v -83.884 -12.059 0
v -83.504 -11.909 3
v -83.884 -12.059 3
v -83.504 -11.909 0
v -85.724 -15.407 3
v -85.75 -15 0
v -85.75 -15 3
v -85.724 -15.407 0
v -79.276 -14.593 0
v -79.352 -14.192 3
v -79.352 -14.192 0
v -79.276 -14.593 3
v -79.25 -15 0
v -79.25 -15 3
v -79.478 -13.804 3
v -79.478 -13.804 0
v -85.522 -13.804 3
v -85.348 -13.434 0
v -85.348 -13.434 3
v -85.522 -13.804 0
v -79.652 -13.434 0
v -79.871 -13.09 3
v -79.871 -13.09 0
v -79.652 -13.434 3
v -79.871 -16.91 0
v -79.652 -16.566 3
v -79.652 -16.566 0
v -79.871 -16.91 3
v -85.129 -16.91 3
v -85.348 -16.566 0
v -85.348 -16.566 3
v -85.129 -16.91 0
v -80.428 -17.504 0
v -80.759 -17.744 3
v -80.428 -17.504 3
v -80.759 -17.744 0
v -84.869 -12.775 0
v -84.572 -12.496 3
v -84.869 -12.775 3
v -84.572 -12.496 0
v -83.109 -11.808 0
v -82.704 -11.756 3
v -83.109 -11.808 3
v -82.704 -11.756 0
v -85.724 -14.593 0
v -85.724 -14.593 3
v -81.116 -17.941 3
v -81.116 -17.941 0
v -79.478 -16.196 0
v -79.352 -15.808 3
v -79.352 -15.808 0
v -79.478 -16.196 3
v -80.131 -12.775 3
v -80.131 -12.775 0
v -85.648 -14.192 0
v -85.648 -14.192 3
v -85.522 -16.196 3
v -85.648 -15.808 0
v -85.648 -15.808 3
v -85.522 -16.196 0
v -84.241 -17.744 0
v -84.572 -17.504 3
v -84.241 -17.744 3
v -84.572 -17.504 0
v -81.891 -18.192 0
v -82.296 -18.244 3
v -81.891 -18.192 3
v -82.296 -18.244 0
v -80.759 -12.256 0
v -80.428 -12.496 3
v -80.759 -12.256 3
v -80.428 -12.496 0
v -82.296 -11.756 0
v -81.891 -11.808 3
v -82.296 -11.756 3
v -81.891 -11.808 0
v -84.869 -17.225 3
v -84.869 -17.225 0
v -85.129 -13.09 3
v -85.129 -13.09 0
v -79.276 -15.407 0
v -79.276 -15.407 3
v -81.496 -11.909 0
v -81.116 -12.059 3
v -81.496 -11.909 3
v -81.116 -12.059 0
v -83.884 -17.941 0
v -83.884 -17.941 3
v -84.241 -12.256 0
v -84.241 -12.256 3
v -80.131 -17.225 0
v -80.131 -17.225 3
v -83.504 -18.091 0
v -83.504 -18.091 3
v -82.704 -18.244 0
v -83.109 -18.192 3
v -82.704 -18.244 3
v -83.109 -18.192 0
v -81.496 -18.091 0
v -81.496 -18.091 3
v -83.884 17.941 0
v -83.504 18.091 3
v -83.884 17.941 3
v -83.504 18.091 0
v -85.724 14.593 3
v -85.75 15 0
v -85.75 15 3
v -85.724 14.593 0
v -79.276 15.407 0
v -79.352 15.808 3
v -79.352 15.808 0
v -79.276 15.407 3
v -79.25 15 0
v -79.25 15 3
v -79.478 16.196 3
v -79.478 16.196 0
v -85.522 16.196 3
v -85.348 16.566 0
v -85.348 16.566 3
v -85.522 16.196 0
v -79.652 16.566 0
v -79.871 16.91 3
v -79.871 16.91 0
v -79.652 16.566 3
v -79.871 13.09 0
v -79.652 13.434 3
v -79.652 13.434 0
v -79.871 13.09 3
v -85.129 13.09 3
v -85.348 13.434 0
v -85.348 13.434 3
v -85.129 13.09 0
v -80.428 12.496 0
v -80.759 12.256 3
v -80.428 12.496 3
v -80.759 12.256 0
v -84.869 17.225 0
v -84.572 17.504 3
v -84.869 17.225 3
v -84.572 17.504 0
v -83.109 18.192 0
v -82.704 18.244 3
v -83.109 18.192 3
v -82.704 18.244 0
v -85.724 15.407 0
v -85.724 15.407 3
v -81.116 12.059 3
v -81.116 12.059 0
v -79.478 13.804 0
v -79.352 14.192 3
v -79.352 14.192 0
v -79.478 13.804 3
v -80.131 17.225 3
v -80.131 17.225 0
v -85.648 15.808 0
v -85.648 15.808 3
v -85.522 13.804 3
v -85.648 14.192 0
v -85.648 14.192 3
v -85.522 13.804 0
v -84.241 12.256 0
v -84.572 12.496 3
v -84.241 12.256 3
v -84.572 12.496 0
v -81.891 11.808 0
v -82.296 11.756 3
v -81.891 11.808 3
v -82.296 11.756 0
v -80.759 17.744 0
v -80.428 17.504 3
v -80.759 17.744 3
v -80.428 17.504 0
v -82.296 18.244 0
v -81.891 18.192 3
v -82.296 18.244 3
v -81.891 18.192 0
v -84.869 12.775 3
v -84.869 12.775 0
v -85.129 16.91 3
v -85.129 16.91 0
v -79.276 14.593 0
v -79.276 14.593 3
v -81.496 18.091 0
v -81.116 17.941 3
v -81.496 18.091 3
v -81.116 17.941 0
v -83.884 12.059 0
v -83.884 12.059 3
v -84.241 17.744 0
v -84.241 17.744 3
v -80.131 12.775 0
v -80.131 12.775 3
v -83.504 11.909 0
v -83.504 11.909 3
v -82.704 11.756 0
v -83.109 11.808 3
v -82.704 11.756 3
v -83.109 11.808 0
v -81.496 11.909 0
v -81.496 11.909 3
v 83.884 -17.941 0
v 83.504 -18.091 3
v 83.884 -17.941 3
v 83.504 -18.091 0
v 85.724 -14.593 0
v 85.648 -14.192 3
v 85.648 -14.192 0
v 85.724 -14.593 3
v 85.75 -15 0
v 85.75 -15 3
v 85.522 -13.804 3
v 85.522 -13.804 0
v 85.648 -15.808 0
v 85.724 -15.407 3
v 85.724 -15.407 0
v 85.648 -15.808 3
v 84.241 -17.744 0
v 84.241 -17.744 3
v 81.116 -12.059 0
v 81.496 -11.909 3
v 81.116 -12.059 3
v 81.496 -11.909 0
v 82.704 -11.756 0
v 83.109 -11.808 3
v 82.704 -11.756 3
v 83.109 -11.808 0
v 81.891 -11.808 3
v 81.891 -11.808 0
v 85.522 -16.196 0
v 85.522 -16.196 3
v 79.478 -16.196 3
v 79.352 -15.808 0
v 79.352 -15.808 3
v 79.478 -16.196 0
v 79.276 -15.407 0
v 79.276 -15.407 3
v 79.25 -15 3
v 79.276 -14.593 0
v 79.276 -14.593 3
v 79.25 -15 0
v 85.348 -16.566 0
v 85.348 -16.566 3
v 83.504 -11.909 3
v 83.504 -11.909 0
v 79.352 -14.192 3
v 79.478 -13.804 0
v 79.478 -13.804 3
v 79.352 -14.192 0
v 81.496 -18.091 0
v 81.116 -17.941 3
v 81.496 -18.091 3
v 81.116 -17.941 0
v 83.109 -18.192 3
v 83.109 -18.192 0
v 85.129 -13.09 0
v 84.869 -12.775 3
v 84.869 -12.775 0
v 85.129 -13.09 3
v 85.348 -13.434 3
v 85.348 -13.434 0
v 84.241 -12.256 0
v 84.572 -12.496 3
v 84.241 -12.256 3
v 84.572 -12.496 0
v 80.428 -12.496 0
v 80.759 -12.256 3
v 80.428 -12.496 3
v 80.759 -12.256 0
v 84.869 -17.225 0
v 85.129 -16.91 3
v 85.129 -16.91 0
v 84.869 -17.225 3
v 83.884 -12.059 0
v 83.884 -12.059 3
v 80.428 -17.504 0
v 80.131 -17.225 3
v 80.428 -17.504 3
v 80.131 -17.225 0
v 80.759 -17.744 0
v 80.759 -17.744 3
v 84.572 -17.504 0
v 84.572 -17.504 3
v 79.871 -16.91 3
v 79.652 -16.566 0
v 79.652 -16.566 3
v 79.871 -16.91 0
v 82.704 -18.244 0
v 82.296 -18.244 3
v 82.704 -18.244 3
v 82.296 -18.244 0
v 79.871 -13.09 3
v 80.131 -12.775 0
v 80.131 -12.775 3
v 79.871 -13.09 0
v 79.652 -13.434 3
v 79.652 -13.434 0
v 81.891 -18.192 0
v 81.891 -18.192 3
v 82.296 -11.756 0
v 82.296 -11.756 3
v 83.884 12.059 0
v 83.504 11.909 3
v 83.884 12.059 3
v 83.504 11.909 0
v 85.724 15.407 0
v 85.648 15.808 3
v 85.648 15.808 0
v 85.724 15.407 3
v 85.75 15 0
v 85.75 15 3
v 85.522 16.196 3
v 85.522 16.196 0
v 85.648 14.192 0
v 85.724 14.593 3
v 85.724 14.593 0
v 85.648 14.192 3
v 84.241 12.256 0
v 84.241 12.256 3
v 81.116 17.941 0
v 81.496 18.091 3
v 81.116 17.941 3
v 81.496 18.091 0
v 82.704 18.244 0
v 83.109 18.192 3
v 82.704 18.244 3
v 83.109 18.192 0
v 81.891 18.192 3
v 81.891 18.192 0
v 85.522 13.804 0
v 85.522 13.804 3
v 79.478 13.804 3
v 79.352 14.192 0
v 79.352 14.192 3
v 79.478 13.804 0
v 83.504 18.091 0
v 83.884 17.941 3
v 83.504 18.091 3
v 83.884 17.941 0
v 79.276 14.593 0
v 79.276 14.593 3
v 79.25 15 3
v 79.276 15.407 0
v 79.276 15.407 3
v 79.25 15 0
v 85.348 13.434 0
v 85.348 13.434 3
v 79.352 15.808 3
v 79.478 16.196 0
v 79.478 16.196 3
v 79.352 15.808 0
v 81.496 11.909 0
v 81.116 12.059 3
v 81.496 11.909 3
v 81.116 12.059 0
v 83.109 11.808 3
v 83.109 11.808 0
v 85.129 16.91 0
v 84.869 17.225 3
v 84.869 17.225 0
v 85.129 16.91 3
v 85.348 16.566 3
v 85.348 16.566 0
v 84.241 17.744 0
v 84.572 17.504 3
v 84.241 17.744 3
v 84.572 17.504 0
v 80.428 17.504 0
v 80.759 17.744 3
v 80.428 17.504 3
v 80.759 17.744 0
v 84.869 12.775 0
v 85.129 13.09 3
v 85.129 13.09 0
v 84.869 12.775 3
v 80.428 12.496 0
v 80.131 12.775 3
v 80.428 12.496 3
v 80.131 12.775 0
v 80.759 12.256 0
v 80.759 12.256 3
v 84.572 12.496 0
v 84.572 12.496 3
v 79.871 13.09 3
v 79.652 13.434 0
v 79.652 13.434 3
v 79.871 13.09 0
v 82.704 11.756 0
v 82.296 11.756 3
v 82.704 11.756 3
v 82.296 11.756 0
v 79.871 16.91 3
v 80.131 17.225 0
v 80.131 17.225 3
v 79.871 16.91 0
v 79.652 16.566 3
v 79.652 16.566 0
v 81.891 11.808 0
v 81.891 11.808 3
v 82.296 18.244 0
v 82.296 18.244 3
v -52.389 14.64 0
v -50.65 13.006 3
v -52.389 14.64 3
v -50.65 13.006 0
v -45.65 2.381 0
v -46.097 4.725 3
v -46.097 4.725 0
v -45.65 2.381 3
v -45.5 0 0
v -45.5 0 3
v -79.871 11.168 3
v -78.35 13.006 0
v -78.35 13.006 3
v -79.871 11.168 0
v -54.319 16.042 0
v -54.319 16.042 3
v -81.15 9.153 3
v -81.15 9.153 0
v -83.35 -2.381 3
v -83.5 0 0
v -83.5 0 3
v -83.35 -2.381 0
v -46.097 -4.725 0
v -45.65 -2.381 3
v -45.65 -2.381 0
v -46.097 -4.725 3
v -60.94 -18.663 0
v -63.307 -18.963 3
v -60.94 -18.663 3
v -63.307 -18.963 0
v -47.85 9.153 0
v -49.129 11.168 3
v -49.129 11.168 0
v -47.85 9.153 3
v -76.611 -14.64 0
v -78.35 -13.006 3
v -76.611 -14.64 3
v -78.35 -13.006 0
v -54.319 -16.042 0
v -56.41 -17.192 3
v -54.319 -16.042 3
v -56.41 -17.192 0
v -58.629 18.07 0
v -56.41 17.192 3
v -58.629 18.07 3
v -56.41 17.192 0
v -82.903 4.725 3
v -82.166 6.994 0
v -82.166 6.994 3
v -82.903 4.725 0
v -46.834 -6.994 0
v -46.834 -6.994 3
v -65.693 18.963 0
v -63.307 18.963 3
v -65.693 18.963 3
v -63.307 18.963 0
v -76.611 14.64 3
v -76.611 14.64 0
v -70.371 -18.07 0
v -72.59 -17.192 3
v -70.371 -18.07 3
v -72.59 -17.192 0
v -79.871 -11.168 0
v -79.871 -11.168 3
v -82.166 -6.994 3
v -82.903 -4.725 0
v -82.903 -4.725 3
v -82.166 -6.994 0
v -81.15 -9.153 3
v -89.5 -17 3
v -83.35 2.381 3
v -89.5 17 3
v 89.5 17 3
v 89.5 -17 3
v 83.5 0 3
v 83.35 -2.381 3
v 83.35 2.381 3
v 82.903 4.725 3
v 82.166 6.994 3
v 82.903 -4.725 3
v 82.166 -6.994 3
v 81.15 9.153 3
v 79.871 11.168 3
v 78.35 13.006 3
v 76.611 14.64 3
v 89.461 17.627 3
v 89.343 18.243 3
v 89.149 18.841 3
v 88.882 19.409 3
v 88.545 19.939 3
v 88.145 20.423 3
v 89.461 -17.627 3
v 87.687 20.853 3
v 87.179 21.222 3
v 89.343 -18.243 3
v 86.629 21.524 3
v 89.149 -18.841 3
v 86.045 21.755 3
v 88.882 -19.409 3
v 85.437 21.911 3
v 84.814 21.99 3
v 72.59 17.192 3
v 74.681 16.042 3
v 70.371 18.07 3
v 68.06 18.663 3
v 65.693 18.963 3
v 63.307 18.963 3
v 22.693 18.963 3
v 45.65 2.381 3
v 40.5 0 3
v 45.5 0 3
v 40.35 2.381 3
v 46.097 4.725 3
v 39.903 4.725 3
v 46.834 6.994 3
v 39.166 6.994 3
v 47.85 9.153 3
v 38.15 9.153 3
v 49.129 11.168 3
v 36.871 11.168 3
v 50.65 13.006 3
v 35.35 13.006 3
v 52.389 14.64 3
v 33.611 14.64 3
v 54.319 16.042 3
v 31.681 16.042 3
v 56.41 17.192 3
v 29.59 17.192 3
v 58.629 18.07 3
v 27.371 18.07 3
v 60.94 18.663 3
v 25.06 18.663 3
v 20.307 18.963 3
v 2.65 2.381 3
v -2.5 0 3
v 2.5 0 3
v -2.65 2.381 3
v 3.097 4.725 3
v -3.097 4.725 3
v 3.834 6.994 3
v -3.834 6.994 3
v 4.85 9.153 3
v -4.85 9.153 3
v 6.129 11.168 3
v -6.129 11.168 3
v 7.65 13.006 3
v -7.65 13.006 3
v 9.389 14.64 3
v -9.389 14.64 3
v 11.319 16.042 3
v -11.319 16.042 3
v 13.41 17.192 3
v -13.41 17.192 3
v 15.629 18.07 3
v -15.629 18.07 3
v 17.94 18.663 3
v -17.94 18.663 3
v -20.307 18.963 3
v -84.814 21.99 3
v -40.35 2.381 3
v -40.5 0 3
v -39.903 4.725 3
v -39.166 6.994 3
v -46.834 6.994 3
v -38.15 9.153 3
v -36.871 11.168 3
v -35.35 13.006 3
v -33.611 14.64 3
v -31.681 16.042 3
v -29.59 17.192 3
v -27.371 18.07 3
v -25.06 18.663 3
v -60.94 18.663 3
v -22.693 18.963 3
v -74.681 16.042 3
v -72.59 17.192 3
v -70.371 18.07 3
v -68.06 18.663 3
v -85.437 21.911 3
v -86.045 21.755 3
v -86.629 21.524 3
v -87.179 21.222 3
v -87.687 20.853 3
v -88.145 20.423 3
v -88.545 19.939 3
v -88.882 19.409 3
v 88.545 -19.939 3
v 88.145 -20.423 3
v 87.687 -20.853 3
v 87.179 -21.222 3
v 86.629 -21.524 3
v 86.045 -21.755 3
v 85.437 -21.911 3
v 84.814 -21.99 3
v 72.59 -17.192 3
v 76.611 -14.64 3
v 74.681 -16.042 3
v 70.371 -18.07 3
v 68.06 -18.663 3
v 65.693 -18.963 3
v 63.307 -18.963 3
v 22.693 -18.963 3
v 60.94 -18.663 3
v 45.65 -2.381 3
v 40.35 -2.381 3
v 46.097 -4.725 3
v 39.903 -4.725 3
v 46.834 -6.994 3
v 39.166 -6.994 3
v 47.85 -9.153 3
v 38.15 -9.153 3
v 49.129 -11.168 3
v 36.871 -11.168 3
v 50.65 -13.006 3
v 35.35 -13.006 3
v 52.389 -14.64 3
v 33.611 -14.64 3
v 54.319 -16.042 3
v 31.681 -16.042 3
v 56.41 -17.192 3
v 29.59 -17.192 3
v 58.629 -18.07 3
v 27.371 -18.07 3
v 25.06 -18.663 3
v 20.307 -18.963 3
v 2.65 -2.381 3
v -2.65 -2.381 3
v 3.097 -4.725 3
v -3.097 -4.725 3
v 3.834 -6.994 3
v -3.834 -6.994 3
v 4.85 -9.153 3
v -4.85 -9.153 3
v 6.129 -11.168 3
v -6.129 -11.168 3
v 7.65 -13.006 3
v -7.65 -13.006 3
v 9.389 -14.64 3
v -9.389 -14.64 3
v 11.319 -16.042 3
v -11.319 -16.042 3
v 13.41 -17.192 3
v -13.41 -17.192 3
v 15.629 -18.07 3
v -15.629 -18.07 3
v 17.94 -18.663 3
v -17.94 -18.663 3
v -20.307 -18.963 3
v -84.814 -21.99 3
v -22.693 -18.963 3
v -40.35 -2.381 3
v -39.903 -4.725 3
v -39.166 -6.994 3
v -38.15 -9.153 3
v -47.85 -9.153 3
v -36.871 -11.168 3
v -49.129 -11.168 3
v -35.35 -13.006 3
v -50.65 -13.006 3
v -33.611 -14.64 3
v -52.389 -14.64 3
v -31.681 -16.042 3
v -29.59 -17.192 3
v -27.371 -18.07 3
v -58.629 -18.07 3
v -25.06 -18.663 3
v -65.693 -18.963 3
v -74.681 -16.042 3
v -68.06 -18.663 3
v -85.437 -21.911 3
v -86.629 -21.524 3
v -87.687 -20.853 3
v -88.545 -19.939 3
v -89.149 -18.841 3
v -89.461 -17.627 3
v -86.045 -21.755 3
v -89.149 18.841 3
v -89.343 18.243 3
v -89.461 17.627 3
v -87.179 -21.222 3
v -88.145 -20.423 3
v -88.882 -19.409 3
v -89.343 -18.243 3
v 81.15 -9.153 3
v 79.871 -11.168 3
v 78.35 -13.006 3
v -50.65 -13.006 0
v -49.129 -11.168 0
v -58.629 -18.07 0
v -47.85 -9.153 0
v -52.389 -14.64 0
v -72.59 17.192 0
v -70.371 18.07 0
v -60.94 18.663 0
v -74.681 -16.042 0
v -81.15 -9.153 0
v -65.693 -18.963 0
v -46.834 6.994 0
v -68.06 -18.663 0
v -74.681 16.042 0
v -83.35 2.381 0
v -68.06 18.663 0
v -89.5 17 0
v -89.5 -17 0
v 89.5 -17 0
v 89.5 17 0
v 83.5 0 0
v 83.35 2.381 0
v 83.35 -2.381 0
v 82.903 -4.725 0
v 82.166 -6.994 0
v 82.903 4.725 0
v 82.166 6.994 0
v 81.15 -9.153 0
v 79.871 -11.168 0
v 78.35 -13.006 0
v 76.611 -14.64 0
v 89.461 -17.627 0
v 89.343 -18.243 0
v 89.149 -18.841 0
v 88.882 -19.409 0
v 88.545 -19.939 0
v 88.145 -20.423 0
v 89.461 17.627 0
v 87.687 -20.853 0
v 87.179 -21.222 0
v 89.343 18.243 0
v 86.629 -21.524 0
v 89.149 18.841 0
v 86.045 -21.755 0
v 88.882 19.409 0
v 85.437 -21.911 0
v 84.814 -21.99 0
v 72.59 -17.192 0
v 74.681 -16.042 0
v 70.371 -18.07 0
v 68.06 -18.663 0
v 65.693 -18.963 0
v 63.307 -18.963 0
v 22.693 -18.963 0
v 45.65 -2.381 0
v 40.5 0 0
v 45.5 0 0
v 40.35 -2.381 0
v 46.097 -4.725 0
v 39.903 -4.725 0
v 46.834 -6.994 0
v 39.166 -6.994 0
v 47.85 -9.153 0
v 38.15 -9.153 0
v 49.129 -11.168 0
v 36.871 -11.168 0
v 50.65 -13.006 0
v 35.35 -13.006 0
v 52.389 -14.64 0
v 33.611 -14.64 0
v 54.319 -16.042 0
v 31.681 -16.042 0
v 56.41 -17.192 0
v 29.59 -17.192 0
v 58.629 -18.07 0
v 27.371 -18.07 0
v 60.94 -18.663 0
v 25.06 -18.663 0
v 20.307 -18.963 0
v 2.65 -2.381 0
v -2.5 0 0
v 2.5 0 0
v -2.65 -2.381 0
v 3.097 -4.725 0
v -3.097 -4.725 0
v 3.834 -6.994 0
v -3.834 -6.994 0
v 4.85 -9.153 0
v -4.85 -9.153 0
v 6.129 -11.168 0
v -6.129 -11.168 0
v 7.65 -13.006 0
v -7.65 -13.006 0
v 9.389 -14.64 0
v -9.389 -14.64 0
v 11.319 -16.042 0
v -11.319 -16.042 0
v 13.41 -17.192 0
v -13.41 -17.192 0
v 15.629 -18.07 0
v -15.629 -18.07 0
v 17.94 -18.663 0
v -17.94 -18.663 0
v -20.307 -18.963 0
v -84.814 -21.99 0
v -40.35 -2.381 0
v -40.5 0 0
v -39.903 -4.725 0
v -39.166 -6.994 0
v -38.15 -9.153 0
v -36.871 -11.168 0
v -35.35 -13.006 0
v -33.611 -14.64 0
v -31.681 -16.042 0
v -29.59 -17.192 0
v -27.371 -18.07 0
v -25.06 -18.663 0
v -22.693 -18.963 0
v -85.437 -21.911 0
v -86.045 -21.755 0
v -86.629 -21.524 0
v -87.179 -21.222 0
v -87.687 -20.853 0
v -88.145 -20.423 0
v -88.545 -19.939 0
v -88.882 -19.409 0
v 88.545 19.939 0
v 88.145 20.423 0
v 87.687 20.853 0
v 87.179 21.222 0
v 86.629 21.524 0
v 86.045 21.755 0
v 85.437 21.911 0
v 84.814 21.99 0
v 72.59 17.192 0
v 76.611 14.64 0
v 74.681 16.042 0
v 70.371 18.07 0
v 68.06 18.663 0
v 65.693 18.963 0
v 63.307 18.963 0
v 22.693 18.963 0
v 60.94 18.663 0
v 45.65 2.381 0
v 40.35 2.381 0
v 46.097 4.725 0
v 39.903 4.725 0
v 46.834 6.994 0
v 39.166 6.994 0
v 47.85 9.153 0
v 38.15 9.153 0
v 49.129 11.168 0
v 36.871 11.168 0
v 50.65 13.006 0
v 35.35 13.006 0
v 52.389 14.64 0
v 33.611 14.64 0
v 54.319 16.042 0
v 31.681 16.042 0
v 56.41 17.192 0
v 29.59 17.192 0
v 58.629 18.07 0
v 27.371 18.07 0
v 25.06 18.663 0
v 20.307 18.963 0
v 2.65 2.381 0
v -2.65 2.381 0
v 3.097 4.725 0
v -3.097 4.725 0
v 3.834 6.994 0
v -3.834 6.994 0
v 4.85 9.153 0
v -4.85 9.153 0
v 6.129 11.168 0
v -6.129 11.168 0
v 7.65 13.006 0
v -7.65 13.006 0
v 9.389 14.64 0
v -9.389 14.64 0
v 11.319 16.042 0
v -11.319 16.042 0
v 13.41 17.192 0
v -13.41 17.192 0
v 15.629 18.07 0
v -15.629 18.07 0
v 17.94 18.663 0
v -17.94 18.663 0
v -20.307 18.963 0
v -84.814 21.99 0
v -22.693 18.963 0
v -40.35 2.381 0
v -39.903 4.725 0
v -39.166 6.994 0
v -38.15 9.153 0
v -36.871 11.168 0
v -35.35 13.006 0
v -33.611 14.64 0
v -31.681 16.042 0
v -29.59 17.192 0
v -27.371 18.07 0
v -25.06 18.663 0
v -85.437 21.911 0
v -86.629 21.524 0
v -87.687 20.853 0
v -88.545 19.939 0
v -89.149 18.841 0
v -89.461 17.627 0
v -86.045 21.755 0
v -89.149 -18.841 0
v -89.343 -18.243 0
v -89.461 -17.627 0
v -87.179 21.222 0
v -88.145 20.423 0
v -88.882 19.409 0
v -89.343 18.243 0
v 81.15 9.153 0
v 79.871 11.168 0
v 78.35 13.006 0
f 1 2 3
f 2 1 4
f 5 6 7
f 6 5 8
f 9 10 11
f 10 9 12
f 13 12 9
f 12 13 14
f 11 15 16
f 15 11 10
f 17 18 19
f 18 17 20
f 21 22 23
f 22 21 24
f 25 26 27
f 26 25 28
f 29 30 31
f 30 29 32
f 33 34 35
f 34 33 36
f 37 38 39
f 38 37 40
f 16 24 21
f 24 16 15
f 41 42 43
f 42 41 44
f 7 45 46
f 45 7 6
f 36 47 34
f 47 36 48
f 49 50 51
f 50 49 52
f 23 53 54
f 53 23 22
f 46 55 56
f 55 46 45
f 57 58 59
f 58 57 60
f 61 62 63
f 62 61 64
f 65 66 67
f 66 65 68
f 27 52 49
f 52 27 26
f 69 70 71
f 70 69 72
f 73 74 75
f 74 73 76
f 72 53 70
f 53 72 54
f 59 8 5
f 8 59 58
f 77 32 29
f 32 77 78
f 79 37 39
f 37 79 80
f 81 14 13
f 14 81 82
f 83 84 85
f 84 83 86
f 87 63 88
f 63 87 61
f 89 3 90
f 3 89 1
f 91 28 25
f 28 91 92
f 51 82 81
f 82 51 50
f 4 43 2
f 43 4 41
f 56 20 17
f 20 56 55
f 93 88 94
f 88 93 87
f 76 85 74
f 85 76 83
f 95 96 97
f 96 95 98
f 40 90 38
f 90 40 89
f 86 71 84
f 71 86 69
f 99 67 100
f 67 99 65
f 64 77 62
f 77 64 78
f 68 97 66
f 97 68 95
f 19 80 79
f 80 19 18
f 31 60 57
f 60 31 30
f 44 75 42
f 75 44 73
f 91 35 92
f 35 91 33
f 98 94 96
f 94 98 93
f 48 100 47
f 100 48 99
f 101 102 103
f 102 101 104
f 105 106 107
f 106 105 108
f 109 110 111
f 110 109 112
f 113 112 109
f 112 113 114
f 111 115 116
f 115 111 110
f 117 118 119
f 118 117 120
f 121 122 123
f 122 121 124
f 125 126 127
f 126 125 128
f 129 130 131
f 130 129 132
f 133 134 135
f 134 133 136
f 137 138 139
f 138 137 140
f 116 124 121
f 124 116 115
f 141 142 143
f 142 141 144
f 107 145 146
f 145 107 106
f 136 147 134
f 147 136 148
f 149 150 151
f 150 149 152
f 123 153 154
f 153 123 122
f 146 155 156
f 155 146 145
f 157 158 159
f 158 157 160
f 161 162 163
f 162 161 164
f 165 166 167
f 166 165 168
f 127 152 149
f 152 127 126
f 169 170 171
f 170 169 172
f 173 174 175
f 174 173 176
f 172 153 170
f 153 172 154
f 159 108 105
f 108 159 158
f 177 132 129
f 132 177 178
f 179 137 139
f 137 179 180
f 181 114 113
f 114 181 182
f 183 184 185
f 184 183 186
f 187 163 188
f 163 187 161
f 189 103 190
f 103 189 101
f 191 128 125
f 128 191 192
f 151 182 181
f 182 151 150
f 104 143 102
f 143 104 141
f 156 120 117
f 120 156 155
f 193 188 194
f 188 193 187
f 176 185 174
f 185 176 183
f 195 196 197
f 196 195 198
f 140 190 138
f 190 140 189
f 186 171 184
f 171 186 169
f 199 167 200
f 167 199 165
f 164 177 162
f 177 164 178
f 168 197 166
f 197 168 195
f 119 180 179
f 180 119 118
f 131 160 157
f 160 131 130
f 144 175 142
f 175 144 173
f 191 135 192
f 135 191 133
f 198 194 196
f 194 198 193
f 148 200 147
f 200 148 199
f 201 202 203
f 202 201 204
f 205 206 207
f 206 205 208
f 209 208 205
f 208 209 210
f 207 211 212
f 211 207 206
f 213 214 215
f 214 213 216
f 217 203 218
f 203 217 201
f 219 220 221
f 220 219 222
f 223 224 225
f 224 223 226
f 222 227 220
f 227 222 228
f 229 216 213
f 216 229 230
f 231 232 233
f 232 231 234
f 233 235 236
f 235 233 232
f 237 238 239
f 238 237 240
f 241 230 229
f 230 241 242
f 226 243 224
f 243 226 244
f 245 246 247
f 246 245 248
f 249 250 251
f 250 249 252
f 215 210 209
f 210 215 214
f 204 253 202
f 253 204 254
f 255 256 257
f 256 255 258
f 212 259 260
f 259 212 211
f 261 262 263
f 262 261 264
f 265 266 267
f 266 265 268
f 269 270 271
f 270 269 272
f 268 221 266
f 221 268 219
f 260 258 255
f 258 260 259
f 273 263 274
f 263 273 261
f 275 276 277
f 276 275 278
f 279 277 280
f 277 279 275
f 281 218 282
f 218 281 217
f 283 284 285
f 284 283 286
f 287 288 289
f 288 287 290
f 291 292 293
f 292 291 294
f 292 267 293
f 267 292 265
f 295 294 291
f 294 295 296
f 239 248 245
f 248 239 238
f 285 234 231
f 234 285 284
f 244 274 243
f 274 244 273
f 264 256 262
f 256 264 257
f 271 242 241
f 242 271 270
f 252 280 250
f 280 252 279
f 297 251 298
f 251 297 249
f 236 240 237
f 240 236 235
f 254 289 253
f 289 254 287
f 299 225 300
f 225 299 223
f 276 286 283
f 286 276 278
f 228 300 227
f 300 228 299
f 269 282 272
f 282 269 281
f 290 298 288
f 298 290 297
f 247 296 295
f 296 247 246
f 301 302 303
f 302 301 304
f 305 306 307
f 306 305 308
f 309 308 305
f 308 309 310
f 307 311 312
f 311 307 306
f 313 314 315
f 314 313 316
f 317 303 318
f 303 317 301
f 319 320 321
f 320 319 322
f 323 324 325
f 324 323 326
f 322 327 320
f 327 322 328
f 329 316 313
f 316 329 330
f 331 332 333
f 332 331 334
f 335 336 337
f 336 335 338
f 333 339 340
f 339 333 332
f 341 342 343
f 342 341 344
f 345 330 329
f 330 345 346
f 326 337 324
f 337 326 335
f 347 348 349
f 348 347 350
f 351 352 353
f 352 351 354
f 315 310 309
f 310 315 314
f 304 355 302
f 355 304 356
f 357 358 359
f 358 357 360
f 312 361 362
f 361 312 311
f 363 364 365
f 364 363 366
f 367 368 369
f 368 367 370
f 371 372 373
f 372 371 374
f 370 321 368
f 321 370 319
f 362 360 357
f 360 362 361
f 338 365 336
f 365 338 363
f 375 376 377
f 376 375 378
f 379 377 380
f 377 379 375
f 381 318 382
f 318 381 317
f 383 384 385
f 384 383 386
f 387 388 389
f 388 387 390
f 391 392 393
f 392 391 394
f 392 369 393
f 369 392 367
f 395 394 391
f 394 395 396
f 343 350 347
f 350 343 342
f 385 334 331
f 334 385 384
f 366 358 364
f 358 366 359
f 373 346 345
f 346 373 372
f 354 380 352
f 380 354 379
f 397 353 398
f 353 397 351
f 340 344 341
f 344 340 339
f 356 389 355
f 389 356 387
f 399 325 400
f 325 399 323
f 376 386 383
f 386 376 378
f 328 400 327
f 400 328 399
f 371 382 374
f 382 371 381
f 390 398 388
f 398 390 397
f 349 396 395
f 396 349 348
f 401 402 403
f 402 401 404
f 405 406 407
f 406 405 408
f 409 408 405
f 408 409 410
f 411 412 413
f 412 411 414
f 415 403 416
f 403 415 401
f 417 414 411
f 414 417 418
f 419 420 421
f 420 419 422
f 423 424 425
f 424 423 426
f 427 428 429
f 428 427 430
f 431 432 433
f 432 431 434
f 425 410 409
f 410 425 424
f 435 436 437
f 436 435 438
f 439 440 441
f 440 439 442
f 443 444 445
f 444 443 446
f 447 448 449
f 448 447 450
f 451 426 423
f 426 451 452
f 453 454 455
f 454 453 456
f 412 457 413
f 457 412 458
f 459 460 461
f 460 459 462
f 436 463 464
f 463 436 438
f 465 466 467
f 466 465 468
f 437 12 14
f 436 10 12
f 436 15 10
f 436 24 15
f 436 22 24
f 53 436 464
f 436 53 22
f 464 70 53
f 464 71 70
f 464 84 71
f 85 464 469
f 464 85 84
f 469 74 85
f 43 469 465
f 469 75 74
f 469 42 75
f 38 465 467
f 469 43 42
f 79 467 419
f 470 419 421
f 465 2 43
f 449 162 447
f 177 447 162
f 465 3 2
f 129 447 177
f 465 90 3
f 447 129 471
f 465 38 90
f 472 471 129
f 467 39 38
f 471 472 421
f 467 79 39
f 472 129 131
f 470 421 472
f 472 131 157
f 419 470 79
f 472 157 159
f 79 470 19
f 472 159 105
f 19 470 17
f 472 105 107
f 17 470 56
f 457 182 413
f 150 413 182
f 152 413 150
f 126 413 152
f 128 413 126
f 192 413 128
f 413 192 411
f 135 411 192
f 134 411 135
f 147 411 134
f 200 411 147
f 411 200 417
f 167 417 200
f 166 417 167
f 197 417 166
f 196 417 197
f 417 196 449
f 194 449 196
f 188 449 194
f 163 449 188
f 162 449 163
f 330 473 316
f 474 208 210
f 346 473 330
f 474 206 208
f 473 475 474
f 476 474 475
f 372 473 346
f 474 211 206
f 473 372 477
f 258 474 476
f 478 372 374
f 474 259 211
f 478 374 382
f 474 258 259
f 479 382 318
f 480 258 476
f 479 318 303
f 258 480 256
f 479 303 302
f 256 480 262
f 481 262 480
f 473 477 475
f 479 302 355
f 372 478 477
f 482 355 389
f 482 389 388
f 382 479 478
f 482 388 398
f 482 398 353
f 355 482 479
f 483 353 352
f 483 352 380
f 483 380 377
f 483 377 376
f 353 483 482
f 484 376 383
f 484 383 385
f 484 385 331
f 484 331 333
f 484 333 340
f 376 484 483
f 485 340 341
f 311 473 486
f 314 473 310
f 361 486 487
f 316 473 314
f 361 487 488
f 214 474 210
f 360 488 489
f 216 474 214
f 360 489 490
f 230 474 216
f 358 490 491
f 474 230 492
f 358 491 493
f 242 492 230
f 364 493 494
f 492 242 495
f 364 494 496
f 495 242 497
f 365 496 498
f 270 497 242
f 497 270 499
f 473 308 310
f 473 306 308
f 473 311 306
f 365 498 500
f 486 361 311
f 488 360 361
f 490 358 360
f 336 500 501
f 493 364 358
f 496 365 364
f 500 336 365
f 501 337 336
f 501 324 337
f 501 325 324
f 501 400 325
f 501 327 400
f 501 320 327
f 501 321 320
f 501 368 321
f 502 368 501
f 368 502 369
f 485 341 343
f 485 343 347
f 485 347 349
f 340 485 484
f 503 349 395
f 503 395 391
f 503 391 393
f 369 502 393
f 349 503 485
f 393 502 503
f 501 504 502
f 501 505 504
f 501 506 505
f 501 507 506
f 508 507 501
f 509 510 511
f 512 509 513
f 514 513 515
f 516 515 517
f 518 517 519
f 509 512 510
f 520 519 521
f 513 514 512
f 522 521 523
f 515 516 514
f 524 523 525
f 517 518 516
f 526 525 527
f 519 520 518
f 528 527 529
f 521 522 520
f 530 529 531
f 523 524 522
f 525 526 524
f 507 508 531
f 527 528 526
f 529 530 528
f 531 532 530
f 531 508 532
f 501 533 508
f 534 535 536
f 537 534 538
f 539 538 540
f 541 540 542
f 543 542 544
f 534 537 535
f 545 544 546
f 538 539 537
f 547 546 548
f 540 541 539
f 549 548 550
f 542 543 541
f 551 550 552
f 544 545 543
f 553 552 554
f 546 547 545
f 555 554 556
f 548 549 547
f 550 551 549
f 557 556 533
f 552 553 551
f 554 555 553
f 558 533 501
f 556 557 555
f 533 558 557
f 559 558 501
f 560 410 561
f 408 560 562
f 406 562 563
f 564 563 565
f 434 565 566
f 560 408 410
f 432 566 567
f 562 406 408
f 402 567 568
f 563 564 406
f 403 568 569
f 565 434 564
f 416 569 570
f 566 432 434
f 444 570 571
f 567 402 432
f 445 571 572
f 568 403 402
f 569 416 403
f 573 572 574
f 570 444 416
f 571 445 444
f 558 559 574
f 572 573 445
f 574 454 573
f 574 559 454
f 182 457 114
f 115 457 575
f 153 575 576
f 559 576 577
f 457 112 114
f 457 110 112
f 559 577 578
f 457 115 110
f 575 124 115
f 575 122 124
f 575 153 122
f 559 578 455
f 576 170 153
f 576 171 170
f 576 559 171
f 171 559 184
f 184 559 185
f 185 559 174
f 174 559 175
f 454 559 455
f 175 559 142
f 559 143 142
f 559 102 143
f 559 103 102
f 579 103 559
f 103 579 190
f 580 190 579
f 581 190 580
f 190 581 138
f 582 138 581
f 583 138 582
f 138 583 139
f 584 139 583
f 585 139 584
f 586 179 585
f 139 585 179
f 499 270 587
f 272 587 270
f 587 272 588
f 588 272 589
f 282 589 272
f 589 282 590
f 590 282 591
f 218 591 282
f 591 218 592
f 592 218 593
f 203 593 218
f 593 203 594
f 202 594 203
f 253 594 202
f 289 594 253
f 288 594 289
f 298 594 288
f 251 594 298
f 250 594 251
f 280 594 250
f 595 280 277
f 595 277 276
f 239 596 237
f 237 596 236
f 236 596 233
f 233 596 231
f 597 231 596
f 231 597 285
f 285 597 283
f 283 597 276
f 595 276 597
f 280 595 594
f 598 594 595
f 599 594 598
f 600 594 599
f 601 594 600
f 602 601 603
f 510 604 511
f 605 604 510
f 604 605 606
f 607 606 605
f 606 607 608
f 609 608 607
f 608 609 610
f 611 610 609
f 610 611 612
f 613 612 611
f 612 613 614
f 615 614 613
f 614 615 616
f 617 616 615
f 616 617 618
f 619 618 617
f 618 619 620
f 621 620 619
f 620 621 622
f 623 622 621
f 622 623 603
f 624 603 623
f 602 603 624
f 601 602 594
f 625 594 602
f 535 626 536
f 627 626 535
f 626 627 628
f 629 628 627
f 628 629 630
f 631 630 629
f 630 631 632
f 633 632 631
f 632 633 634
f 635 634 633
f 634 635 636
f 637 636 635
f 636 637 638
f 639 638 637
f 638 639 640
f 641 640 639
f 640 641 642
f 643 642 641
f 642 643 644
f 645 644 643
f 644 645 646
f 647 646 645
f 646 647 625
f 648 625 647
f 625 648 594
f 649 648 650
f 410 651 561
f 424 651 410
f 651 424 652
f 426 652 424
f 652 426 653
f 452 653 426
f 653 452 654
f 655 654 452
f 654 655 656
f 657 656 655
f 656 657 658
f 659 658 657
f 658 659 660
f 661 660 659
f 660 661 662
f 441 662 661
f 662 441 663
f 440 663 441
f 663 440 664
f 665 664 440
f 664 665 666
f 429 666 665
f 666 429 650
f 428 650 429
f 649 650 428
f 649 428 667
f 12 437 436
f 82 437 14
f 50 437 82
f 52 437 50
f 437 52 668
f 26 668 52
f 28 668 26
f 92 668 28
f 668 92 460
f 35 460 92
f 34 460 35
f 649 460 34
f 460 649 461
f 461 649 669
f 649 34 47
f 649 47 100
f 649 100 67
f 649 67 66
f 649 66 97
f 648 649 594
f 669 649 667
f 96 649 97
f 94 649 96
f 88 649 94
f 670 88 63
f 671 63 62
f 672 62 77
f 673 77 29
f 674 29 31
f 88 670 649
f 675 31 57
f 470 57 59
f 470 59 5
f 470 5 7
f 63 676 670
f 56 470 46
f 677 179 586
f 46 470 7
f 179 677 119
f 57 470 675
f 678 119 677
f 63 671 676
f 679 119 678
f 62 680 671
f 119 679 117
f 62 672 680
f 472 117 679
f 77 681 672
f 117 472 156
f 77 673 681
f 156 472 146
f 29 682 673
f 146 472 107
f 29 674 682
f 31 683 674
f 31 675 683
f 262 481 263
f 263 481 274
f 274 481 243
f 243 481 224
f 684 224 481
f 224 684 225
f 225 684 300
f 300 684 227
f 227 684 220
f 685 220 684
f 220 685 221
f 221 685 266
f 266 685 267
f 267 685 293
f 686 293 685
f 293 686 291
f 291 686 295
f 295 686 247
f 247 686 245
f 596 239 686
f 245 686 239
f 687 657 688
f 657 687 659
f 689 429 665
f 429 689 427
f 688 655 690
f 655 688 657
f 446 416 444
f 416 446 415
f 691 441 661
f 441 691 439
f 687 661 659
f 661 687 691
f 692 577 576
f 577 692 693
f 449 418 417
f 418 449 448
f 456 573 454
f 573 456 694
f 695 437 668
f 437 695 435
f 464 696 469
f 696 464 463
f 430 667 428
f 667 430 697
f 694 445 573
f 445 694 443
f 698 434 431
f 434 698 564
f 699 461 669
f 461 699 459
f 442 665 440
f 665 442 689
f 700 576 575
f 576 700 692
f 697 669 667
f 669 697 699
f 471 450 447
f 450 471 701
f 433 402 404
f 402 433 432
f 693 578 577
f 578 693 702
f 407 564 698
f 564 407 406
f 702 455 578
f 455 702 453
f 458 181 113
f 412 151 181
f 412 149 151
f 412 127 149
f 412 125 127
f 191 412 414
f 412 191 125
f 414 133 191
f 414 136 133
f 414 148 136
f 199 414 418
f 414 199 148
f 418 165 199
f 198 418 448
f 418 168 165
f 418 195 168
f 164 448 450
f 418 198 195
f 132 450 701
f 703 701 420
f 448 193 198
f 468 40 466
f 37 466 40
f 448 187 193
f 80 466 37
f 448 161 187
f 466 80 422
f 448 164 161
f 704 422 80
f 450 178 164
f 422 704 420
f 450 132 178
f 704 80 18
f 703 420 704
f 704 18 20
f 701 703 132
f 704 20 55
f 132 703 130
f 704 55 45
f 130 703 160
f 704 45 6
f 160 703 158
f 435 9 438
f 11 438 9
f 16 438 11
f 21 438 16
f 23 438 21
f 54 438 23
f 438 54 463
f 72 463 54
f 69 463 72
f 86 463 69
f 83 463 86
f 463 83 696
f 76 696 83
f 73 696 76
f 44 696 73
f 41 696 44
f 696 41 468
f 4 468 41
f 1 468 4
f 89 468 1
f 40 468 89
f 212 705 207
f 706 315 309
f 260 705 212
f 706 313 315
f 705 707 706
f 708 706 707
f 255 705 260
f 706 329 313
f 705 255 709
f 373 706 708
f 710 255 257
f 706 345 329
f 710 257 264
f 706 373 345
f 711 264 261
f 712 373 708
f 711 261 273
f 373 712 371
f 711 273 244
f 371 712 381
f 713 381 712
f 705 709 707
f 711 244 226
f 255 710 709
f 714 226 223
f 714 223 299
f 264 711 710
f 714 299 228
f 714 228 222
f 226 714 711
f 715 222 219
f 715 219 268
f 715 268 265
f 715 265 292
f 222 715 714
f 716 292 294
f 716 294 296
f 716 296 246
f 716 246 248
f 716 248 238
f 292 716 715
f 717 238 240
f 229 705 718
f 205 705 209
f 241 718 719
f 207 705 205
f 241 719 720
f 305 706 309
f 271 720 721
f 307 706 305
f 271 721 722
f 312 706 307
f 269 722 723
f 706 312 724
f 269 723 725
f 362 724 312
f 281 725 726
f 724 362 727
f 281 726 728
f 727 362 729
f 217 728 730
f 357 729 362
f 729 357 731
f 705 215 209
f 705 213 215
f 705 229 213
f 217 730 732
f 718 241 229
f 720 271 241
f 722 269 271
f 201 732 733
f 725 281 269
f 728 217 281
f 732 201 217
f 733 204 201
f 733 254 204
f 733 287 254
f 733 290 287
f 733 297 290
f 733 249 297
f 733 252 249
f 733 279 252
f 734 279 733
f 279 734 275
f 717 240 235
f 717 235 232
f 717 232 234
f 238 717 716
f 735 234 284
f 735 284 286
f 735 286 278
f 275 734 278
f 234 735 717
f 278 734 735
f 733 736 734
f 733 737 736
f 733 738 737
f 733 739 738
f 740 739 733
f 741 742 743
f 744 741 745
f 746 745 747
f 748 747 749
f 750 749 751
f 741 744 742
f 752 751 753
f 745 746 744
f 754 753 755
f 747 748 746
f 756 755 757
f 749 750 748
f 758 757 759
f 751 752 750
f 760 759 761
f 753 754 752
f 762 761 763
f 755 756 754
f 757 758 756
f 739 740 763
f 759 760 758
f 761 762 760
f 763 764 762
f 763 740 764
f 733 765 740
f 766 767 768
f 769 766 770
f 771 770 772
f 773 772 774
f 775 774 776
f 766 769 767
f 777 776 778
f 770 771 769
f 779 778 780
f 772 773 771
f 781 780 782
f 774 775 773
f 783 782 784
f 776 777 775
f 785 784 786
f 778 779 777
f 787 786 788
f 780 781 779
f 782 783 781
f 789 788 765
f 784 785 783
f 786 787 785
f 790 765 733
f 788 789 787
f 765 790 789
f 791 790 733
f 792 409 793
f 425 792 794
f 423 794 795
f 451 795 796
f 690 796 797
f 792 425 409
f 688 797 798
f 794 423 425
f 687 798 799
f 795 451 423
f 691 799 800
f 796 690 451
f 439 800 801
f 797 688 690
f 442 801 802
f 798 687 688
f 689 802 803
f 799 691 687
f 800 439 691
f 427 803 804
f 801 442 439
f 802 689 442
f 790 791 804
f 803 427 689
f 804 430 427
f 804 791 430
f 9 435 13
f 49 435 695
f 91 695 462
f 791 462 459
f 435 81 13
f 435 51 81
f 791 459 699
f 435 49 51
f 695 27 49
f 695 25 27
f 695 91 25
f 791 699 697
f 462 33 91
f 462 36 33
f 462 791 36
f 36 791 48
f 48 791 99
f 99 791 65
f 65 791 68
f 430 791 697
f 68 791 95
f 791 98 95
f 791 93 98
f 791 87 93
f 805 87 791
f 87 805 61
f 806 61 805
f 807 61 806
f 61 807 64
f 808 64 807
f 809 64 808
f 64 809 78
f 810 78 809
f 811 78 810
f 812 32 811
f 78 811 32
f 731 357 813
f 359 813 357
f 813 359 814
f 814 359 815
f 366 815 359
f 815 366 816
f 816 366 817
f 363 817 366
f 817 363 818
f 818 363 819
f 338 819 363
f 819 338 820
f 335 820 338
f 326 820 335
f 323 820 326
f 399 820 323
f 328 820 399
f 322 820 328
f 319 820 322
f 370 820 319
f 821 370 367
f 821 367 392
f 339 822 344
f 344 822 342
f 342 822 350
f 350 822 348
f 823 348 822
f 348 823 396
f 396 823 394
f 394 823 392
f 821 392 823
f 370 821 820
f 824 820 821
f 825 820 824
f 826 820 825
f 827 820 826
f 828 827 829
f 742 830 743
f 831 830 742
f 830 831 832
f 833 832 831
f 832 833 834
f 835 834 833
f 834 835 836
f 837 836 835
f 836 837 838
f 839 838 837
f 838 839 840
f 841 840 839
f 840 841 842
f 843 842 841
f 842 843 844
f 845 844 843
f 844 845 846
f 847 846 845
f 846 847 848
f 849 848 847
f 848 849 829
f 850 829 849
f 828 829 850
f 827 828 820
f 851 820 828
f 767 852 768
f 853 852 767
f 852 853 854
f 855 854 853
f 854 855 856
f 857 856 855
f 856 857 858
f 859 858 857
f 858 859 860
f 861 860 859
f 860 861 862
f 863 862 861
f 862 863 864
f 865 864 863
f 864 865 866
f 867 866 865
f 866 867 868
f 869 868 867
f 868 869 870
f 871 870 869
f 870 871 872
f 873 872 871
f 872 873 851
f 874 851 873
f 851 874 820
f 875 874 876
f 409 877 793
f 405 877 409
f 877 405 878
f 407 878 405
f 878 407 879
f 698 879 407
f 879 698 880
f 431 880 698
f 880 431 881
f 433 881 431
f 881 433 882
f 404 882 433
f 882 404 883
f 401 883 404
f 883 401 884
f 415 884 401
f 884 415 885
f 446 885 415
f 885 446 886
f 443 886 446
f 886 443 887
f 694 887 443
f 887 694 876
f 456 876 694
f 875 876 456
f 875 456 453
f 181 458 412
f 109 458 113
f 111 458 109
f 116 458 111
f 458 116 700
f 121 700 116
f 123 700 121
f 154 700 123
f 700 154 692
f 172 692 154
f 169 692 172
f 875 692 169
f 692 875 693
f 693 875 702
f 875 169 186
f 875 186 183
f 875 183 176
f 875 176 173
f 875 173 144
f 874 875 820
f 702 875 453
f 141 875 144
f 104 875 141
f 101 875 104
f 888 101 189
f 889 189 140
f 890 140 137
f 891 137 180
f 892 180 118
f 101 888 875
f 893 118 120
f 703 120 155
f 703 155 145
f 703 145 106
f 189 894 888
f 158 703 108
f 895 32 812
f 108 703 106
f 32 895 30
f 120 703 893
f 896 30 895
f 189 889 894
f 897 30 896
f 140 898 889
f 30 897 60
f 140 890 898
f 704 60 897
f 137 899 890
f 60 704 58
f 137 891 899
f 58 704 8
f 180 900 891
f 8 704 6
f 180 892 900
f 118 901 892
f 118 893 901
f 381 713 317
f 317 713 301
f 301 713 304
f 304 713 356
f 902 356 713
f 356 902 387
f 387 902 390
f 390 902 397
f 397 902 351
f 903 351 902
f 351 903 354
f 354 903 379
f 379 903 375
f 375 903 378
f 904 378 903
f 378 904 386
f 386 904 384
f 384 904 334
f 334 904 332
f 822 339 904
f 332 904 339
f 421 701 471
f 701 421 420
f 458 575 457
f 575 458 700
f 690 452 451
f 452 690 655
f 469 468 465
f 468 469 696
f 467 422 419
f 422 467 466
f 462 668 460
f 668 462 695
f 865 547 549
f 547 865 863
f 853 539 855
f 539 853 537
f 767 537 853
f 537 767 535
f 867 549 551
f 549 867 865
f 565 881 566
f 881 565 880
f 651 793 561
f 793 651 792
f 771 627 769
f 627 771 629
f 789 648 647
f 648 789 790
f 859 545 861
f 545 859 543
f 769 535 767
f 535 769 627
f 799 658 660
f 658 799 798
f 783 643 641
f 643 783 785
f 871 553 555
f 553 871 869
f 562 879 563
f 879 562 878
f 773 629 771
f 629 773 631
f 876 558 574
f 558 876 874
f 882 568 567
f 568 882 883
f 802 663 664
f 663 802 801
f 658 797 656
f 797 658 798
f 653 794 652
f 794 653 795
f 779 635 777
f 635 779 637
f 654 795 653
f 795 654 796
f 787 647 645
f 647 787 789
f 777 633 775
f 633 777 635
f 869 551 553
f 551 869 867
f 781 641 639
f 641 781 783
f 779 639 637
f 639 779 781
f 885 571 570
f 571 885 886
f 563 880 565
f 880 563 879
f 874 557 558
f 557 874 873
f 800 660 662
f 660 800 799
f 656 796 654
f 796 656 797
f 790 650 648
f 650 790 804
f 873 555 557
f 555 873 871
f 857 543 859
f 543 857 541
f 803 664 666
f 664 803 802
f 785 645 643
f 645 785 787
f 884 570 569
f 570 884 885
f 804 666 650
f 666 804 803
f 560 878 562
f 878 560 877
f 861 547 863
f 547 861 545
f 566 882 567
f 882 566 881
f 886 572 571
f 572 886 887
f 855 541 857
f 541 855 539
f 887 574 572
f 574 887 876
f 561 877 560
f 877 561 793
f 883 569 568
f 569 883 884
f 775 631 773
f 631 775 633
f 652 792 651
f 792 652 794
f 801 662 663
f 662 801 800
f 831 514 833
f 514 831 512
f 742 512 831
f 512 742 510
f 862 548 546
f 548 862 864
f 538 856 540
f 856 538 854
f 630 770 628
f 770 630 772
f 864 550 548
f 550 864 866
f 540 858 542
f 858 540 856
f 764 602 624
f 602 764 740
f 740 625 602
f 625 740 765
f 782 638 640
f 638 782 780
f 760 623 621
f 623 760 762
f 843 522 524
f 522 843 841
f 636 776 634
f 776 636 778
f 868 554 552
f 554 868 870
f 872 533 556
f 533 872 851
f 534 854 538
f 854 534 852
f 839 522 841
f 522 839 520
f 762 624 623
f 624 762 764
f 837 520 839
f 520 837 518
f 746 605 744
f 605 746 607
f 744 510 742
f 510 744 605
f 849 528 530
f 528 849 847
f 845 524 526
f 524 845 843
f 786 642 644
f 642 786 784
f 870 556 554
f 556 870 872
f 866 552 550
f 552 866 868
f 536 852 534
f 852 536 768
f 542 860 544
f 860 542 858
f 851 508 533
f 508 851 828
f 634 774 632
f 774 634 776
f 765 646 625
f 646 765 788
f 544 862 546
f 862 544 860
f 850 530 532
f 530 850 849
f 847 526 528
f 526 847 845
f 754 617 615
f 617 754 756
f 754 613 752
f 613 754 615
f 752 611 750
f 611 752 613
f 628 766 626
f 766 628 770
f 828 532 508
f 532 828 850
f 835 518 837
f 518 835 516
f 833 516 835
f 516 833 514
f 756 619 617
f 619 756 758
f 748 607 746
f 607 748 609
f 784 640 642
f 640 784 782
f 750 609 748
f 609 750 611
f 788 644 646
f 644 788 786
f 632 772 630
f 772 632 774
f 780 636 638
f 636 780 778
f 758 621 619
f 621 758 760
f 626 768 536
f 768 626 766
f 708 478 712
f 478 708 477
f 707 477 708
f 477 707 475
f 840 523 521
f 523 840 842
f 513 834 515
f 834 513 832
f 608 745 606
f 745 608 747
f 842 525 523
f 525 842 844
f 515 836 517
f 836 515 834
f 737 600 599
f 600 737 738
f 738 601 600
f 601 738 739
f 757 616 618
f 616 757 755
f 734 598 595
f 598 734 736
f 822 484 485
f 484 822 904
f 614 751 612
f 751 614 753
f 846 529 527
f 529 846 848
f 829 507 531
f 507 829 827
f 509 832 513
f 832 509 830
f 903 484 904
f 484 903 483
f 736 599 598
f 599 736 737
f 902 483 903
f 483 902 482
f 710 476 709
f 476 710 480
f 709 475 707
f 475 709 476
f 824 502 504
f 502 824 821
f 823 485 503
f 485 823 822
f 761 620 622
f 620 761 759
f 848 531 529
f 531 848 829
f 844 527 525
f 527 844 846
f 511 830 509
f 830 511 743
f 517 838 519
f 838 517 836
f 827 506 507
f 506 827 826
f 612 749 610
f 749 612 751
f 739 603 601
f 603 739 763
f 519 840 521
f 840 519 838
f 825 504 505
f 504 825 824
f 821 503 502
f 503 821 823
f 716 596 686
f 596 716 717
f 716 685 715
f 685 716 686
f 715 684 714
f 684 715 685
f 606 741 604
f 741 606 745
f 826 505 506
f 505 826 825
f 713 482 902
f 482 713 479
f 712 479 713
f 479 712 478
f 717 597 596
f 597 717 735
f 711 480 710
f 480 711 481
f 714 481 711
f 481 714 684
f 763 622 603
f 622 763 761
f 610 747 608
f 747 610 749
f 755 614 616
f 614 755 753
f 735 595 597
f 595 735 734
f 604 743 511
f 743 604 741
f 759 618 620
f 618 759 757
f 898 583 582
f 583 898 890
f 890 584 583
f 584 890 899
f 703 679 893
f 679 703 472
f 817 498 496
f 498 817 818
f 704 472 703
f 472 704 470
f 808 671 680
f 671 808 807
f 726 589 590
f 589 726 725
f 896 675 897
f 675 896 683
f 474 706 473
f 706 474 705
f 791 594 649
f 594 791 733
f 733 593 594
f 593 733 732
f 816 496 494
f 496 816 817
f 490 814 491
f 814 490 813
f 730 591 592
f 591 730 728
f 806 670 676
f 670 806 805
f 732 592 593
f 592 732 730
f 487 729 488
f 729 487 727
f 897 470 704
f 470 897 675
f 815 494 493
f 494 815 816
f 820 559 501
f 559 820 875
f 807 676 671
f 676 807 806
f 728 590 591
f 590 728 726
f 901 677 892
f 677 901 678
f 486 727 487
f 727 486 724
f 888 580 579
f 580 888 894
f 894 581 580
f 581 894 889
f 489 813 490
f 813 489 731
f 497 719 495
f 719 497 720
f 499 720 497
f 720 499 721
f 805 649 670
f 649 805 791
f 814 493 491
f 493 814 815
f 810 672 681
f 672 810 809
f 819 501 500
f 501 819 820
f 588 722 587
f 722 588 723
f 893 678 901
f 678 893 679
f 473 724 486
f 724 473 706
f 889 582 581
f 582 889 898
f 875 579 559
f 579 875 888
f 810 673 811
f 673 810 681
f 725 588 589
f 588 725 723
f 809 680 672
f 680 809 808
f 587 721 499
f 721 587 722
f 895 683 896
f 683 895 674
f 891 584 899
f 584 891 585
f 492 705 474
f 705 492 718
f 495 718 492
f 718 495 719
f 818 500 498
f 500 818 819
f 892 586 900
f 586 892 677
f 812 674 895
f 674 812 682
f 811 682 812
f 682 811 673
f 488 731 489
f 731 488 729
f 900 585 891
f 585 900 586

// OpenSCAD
$fn = 50;


difference() {
	union() {
		hull() {
			translate(v = [-84.5000000000, 17.0000000000, 0]) {
				cylinder(h = 3, r = 5);
			}
			translate(v = [84.5000000000, 17.0000000000, 0]) {
				cylinder(h = 3, r = 5);
			}
			translate(v = [-84.5000000000, -17.0000000000, 0]) {
				cylinder(h = 3, r = 5);
			}
			translate(v = [84.5000000000, -17.0000000000, 0]) {
				cylinder(h = 3, r = 5);
			}
		}
	}
	union() {
		#translate(v = [-82.5000000000, -15.0000000000, -100.0000000000]) {
			cylinder(h = 200, r = 3.2500000000);
		}
		#translate(v = [-82.5000000000, 15.0000000000, -100.0000000000]) {
			cylinder(h = 200, r = 3.2500000000);
		}
		#translate(v = [82.5000000000, -15.0000000000, -100.0000000000]) {
			cylinder(h = 200, r = 3.2500000000);
		}
		#translate(v = [82.5000000000, 15.0000000000, -100.0000000000]) {
			cylinder(h = 200, r = 3.2500000000);
		}
		#translate(v = [-64.5000000000, 0, 0]) {
			cylinder(h = 3, r = 19.0000000000);
		}
		#translate(v = [-21.5000000000, 0, 0]) {
			cylinder(h = 3, r = 19.0000000000);
		}
		#translate(v = [21.5000000000, 0, 0]) {
			cylinder(h = 3, r = 19.0000000000);
		}
		#translate(v = [64.5000000000, 0, 0]) {
			cylinder(h = 3, r = 19.0000000000);
		}
	}
}
